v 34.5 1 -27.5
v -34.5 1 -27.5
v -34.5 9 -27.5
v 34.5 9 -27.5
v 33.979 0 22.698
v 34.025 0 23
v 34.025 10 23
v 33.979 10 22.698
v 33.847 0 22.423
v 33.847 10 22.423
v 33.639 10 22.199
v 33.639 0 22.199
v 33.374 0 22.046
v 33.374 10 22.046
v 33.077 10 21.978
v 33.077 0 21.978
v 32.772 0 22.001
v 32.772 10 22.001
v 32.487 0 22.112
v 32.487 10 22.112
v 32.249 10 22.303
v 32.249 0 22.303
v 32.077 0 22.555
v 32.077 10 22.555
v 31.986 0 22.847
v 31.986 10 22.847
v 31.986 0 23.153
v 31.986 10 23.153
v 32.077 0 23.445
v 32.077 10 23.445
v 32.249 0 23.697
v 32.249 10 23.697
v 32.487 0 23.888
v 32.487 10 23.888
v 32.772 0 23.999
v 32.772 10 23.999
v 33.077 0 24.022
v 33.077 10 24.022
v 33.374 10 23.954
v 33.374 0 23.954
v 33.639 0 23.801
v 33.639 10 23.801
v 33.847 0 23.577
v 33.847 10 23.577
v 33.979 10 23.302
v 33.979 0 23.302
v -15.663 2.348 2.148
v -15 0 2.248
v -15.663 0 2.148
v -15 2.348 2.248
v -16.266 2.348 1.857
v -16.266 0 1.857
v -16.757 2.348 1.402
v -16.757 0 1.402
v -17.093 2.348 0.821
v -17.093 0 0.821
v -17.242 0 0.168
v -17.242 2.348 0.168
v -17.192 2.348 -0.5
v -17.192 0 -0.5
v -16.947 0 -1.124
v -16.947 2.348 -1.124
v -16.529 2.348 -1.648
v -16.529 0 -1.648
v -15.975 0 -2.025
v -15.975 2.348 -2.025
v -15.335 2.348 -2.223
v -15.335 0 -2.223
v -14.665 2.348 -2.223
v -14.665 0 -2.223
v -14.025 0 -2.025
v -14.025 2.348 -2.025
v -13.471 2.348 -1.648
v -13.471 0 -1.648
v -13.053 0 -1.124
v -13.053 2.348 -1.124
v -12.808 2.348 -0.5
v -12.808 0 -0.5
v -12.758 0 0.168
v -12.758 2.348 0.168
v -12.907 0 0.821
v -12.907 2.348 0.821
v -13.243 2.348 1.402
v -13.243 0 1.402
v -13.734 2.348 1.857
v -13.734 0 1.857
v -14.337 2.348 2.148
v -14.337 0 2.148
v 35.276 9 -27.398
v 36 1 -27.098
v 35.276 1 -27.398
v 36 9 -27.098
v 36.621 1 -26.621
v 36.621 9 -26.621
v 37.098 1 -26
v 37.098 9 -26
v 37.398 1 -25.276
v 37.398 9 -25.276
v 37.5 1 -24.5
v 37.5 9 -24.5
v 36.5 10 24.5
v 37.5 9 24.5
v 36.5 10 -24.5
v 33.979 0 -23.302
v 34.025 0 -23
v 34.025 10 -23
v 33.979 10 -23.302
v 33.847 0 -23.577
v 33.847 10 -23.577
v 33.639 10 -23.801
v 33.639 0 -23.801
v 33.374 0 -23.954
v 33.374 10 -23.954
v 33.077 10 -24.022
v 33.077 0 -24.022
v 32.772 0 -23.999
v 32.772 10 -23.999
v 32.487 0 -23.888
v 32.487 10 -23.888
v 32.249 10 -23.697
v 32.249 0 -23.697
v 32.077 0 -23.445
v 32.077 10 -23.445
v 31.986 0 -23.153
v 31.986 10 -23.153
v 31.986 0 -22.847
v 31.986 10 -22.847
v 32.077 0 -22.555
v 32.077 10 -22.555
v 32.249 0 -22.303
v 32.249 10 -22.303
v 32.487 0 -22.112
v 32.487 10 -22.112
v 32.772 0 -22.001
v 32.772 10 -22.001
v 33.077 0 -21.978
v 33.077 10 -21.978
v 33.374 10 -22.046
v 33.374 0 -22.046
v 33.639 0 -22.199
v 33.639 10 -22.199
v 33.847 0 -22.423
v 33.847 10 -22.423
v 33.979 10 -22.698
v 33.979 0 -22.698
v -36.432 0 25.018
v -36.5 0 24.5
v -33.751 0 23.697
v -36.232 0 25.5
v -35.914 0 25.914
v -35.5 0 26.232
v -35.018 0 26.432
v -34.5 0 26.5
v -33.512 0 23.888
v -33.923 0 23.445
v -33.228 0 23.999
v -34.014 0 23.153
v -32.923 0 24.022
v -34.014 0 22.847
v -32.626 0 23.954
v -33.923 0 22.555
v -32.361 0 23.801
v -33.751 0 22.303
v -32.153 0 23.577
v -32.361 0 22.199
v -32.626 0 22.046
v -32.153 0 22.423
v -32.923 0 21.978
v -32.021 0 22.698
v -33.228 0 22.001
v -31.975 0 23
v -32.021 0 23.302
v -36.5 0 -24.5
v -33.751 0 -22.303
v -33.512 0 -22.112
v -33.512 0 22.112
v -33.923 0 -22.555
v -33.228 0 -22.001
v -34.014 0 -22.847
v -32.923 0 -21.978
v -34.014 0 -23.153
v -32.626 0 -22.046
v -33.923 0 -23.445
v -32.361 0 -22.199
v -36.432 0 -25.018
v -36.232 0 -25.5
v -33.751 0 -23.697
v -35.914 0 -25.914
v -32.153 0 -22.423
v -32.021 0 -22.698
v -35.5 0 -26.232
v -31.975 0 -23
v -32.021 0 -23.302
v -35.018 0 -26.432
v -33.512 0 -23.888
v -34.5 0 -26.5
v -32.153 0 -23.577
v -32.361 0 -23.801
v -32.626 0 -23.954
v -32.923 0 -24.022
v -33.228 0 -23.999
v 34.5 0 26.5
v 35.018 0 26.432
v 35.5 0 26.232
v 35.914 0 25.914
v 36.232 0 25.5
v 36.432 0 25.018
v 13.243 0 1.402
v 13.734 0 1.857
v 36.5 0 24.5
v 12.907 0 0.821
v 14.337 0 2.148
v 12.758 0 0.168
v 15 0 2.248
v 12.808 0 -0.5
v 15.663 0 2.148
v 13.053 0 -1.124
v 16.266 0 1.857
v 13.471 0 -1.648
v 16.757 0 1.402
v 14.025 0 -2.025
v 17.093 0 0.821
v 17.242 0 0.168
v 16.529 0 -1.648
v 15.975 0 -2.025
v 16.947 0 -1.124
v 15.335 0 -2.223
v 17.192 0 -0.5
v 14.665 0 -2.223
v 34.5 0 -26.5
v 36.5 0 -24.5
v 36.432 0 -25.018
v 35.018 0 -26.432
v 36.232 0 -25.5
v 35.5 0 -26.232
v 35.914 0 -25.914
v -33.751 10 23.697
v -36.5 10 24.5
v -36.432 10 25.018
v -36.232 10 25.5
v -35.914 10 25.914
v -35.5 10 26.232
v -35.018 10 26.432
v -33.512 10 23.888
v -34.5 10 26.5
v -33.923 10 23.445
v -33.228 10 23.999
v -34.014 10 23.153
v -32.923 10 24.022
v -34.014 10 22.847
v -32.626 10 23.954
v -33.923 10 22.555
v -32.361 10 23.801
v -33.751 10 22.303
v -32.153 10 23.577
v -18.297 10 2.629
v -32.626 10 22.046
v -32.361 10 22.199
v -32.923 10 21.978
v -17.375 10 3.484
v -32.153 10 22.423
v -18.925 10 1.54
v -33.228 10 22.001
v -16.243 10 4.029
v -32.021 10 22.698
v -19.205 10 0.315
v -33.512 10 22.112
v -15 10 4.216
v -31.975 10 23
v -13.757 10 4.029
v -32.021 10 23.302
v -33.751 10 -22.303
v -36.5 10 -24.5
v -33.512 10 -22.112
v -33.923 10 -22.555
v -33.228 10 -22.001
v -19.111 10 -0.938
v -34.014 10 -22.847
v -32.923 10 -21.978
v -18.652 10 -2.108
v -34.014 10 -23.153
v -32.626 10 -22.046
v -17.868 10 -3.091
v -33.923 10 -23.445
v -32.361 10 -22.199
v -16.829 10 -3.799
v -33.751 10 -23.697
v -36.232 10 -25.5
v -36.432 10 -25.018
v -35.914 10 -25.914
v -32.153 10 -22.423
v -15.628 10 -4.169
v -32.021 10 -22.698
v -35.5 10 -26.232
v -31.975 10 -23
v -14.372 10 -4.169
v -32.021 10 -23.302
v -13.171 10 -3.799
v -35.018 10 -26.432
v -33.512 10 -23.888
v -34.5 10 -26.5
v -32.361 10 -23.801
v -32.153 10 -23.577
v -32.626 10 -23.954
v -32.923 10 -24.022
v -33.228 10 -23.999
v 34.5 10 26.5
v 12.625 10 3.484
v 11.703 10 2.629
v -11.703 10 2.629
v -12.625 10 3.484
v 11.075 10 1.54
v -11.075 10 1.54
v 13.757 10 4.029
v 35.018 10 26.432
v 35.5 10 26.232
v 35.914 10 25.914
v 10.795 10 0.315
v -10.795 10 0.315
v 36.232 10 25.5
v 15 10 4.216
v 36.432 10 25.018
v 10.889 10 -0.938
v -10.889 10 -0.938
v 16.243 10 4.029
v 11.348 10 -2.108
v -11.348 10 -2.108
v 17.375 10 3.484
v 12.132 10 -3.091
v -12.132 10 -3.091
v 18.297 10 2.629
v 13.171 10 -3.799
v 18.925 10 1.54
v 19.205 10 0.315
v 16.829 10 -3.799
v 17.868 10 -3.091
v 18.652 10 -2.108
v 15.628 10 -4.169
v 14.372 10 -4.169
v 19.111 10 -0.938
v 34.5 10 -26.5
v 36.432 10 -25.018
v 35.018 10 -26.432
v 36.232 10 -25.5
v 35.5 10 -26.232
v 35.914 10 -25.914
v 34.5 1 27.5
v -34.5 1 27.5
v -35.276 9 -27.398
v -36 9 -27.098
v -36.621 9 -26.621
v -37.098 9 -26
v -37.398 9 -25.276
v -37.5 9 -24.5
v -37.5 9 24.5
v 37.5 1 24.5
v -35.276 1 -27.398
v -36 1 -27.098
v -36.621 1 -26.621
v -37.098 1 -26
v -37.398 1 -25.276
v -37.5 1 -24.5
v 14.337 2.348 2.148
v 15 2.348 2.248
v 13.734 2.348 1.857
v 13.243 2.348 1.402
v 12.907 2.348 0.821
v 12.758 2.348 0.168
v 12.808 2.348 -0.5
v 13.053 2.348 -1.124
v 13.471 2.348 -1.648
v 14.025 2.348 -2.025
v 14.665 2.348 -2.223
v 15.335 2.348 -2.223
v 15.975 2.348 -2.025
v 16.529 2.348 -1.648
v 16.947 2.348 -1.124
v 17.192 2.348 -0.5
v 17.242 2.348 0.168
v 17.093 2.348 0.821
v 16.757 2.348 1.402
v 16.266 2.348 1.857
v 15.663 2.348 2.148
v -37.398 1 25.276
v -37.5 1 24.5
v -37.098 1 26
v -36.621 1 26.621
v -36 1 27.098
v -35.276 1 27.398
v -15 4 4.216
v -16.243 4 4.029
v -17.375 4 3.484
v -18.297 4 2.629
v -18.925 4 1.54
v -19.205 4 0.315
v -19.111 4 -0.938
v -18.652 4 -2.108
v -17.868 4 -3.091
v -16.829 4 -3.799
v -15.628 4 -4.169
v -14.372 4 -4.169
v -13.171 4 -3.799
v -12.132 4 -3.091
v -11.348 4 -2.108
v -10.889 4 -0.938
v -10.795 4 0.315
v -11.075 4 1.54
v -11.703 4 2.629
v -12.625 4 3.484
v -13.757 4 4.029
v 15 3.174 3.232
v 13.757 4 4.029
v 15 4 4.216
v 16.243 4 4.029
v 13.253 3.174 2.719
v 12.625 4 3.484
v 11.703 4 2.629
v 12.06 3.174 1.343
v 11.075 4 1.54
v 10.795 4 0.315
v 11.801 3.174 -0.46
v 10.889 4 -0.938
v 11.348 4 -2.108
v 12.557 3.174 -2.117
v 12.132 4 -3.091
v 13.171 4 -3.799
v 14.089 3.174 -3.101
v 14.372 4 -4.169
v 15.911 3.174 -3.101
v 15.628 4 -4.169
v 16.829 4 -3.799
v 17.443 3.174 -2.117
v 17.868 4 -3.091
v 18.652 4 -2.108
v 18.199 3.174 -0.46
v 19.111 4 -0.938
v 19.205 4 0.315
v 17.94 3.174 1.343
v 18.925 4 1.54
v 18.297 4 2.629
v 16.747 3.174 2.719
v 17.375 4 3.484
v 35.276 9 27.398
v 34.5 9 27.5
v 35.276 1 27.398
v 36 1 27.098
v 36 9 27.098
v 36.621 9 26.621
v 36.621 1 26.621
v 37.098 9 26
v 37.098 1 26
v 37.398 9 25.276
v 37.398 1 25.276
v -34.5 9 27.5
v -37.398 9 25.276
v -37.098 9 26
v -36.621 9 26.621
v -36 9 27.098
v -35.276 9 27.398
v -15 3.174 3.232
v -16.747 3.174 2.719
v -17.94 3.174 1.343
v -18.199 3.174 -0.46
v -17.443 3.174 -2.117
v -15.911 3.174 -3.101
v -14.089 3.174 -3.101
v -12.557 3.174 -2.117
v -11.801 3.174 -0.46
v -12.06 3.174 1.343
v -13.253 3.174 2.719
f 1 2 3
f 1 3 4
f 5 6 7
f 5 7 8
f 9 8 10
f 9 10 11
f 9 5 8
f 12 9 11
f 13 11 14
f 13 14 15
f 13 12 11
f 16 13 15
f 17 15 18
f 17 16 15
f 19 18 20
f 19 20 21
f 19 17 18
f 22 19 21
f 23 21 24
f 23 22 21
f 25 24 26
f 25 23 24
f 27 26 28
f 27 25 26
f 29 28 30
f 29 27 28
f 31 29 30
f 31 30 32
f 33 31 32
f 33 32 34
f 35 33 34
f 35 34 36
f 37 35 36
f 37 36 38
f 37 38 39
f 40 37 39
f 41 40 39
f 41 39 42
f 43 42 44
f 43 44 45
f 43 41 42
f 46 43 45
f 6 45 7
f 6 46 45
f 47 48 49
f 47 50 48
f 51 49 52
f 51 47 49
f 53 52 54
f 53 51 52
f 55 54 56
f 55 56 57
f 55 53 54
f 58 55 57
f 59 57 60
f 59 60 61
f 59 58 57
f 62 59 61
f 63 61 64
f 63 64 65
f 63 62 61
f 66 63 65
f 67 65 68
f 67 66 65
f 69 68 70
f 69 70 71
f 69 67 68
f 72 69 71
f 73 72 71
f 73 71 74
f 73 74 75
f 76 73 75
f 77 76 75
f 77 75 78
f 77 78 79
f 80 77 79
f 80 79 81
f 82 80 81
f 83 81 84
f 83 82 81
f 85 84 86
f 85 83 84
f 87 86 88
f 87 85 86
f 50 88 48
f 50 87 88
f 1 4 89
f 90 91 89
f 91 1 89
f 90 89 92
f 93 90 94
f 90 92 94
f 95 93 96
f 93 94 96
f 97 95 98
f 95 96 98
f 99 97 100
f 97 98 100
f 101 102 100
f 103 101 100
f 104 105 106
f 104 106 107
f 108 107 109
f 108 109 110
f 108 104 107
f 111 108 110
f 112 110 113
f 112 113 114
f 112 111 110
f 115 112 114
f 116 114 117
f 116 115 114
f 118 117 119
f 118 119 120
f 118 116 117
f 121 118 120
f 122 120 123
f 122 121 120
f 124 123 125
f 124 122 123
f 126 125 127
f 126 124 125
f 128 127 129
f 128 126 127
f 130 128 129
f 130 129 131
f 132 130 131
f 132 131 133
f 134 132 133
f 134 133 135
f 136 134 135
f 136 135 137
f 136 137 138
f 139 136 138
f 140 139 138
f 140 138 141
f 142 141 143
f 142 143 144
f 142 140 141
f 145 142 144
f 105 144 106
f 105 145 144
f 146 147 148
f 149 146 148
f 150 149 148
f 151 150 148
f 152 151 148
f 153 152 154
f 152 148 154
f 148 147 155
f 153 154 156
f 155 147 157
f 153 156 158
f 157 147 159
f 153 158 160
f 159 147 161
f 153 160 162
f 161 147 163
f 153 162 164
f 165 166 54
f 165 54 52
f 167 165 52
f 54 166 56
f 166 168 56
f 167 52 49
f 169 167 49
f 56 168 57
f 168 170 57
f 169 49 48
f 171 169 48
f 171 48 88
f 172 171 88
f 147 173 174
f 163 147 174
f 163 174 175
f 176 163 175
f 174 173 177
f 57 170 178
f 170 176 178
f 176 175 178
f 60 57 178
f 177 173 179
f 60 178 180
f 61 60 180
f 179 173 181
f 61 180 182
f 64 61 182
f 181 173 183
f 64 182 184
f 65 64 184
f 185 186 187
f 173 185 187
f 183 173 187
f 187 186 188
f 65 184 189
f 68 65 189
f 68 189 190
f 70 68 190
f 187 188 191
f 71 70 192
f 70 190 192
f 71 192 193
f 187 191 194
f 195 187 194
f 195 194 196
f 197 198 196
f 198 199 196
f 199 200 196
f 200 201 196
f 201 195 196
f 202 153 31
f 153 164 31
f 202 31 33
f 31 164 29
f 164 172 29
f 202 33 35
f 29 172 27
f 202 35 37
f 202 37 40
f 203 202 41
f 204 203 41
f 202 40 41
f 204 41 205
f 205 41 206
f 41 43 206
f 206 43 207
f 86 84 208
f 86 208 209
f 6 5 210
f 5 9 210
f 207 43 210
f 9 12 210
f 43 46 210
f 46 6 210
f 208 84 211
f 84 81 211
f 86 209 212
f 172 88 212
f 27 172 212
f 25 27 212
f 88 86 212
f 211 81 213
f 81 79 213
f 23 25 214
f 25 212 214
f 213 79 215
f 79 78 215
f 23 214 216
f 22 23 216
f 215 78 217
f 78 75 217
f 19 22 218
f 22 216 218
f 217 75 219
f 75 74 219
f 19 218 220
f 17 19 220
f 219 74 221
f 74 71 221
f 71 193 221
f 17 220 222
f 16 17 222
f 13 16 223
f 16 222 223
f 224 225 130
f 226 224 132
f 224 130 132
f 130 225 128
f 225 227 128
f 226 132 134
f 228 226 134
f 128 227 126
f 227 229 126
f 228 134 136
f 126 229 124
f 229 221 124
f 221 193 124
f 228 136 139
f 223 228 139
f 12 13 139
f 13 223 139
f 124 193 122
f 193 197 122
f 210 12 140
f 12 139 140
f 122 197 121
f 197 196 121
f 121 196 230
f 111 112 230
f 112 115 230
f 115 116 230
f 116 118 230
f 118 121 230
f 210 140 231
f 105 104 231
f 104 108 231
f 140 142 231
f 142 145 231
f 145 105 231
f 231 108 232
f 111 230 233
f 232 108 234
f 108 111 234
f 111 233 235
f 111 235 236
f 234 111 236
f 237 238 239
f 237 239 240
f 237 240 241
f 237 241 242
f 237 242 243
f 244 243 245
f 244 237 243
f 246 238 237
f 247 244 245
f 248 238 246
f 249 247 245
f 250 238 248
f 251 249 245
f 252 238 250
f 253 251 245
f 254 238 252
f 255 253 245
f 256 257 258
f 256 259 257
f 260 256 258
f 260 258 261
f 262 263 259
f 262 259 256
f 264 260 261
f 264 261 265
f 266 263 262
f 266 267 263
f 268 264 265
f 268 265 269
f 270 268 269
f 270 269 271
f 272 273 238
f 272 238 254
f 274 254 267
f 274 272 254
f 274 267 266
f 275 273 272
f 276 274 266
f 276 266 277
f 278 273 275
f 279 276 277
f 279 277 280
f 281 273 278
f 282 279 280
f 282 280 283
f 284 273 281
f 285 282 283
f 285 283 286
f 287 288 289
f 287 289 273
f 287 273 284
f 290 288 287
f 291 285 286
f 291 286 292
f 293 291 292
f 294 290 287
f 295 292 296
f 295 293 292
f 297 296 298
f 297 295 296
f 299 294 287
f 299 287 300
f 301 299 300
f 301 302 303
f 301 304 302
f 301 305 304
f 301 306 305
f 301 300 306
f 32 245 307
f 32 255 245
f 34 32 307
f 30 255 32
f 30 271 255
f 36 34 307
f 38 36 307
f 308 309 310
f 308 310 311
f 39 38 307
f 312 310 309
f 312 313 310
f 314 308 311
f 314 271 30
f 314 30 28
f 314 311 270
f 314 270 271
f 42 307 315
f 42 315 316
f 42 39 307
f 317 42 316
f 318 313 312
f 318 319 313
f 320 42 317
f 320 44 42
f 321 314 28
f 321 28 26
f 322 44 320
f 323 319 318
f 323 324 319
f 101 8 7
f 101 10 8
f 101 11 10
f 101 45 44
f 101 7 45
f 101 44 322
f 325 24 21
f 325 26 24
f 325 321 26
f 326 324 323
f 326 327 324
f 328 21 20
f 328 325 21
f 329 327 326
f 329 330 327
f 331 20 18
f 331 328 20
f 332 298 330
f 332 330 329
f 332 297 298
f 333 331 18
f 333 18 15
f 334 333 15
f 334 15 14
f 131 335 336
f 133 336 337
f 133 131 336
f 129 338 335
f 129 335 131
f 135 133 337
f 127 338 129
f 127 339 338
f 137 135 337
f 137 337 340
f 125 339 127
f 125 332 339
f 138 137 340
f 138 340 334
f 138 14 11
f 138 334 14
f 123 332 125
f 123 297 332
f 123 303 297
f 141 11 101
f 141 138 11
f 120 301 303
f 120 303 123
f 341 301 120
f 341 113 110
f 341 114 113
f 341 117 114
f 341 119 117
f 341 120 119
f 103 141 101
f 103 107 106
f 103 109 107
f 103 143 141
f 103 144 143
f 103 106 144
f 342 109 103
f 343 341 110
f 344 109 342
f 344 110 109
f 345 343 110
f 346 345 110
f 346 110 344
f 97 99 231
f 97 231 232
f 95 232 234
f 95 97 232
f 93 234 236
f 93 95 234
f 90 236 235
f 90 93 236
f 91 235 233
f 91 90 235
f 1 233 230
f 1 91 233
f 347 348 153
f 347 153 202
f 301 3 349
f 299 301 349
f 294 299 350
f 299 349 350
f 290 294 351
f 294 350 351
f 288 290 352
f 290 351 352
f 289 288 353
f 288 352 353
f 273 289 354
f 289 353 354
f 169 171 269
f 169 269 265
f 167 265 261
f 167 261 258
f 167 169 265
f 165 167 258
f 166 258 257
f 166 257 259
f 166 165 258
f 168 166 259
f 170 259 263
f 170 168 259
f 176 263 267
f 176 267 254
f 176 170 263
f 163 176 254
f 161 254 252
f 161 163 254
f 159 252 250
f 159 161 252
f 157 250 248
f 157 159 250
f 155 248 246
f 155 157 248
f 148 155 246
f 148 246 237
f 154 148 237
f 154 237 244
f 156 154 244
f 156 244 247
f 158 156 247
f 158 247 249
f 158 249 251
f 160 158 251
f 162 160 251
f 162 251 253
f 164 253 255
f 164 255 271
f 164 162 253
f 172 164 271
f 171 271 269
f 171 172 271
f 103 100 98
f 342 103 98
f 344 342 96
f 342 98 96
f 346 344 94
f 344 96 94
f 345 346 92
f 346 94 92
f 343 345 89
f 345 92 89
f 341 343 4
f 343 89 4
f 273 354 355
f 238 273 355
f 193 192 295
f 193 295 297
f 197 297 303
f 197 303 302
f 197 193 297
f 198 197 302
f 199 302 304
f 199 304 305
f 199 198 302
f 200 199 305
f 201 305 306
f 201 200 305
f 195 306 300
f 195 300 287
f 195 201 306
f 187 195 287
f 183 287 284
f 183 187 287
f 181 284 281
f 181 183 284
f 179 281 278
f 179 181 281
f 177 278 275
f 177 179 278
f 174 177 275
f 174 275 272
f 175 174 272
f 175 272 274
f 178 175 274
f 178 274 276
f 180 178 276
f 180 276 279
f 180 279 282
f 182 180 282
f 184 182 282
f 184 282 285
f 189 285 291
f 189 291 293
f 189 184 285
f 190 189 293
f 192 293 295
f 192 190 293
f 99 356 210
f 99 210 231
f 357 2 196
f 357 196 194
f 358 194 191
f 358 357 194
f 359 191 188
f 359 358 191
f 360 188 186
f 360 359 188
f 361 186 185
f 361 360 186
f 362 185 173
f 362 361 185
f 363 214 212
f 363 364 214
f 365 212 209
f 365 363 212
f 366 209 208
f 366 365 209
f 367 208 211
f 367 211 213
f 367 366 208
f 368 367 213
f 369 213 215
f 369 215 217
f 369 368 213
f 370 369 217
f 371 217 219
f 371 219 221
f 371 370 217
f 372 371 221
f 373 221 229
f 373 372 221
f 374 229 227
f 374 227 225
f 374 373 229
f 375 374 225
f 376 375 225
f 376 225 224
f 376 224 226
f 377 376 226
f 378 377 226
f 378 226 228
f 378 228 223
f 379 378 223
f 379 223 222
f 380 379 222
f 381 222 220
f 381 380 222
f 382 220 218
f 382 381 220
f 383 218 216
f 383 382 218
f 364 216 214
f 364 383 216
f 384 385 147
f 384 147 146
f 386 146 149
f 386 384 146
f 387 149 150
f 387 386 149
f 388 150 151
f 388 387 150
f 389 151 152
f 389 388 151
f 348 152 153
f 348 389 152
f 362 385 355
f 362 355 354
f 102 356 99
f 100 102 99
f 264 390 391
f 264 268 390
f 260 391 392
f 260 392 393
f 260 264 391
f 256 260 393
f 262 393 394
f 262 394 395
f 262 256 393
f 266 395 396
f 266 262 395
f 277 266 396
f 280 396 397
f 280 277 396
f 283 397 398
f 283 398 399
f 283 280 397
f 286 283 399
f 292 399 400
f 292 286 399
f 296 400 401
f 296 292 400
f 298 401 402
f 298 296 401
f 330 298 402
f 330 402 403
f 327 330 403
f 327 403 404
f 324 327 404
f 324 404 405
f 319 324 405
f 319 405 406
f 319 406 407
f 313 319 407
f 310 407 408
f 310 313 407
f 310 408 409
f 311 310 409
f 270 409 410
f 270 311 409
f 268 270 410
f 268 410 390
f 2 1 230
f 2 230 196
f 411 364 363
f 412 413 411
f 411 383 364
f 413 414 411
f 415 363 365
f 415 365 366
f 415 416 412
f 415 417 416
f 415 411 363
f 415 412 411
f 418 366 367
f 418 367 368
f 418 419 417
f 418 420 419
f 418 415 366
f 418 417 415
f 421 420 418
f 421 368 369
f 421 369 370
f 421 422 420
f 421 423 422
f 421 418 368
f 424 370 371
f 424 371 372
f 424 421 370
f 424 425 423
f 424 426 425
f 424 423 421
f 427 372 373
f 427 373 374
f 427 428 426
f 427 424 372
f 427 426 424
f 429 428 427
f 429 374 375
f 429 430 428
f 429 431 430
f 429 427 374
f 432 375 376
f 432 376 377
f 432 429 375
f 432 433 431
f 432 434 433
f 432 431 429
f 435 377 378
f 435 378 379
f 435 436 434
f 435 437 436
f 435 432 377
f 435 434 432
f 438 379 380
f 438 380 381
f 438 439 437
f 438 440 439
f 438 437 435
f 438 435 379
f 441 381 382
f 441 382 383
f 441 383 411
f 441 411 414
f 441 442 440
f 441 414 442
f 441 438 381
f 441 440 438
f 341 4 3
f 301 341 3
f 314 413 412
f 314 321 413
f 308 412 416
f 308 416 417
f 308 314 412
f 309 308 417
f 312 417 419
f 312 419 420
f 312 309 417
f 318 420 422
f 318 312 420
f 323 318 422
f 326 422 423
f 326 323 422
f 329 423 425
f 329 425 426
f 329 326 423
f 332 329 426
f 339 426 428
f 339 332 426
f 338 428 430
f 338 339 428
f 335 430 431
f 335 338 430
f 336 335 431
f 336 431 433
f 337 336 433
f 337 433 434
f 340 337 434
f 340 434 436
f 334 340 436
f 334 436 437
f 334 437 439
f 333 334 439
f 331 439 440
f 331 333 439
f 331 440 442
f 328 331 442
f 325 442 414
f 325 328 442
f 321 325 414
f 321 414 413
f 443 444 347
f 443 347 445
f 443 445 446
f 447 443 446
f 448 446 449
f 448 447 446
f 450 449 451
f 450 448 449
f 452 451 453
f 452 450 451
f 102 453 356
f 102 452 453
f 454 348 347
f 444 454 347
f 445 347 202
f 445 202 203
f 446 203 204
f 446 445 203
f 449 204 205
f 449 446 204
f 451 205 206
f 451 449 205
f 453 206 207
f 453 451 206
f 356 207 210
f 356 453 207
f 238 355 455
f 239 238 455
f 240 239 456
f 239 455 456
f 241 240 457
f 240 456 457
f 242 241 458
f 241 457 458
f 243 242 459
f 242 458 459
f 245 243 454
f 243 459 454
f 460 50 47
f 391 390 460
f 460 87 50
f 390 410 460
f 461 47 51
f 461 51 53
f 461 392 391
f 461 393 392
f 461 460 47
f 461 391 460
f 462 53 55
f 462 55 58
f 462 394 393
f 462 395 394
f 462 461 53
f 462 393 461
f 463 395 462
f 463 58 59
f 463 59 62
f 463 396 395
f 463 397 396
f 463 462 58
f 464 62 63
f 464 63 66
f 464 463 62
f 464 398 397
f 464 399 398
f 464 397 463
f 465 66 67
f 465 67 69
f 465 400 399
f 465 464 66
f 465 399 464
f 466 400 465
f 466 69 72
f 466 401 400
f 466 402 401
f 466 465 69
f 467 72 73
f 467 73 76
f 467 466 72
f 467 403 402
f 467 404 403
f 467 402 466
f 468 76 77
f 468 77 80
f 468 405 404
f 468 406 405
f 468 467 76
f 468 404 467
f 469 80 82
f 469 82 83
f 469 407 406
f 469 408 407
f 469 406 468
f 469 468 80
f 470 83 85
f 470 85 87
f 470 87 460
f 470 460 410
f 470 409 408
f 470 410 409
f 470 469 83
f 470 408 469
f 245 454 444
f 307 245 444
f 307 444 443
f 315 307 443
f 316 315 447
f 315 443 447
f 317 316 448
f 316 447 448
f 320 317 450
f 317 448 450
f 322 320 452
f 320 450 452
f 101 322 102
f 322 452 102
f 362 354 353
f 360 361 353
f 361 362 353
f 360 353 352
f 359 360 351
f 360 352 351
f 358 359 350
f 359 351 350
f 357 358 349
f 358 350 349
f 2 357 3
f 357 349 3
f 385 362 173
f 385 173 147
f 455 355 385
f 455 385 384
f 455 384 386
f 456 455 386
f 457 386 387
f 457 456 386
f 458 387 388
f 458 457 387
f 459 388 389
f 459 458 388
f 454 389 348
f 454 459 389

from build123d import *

# Parameters (mm, degrees)
SKETCH1_W                                 = 75
SKETCH1_H                                 = 55
BOSS_EXTRUDE1_DEPTH                       = 10
M2_5X0_45_TAPPED_HOLE1_OUTLINE_R          = 1.025
M2_5X0_45_TAPPED_HOLE1_DEPTH              = 10
CSK_FOR_8_FLAT_HEAD_MACHINE_SCREW_2_COUNT = 2
CSK_FOR_8_FLAT_HEAD_MACHINE_SCREW_2_PITCH = 30
FILLET1_R                                 = 3
CHAMFER1_SIZE                             = 1


# Read off the part's stored shape, not the designer's step: M2.5x0.45 Tapped Hole1
with BuildPart() as part:
    # Sketch1 → Boss-Extrude1 (new body)
    with BuildSketch(Plane(origin=(0, 0, 0), x_dir=(1, 0, 0), z_dir=(0, 1, 0))):
        Rectangle(SKETCH1_W, SKETCH1_H)
    extrude(amount=BOSS_EXTRUDE1_DEPTH)

    # M2.5x0.45 Tapped Hole1 outline → M2.5x0.45 Tapped Hole1 (cut)
    with BuildSketch(Plane(origin=(0, 0, 0), x_dir=(1, 0, 0), z_dir=(0, 1, 0))):
        with Locations((33, -23)):
            Circle(M2_5X0_45_TAPPED_HOLE1_OUTLINE_R)
        with Locations((-33, 23)):
            Circle(M2_5X0_45_TAPPED_HOLE1_OUTLINE_R)
        with Locations((-33, -23)):
            Circle(M2_5X0_45_TAPPED_HOLE1_OUTLINE_R)
        with Locations((33, 23)):
            Circle(M2_5X0_45_TAPPED_HOLE1_OUTLINE_R)
    extrude(amount=M2_5X0_45_TAPPED_HOLE1_DEPTH, mode=Mode.SUBTRACT)

    # Sketch6 → CSK for #8 Flat Head Machine Screw (100)1 (revolve, cut)
    with BuildSketch(Plane(origin=(15, 10, 0), x_dir=(0, 0, 1), z_dir=(1, 0, 0))):
        Polygon((0, 0), (0, 10), (2.2479, 10), (2.2479, 7.651759845), (4.216390729, 6), (4.216390729, 0), align=None)
    csk_for_8_flat_head_machine_screw_100 = revolve(axis=Axis((15, 16.35, 0), (0, -1, 0)), mode=Mode.SUBTRACT)

    # CSK for _8 Flat Head Machine Screw _ 2: CSK for #8 Flat Head Machine Screw (100)1 ×2
    with Locations(*[(-i * CSK_FOR_8_FLAT_HEAD_MACHINE_SCREW_2_PITCH, 0, 0) for i in range(1, CSK_FOR_8_FLAT_HEAD_MACHINE_SCREW_2_COUNT)]):
        add(csk_for_8_flat_head_machine_screw_100, mode=Mode.SUBTRACT)

    # Fillet1
    fillet1_edges = [part.edges().sort_by_distance(p)[0] for p in [
        (37.5, 5, 27.5),
        (-37.5, 5, 27.5),
        (-37.5, 5, -27.5),
        (37.5, 5, -27.5),
    ]]
    fillet(fillet1_edges, radius=FILLET1_R)

    # Chamfer1
    chamfer1_edges = [part.edges().sort_by_distance(p)[0] for p in [
        (37.5, 0, 0),
        (37.5, 10, 0),
        (0, 0, 27.5),
        (-37.5, 0, 0),
        (0, 0, -27.5),
        (-36.621320344, 0, 26.621320344),
        (36.621320344, 0, -26.621320344),
        (-36.621320344, 0, -26.621320344),
        (36.621320344, 0, 26.621320344),
        (0, 10, 27.5),
        (0, 10, -27.5),
        (-37.5, 10, 0),
        (-36.621320344, 10, 26.621320344),
        (36.621320344, 10, -26.621320344),
        (-36.621320344, 10, -26.621320344),
        (36.621320344, 10, 26.621320344),
    ]]
    chamfer(chamfer1_edges, length=CHAMFER1_SIZE)


solid = part.part
